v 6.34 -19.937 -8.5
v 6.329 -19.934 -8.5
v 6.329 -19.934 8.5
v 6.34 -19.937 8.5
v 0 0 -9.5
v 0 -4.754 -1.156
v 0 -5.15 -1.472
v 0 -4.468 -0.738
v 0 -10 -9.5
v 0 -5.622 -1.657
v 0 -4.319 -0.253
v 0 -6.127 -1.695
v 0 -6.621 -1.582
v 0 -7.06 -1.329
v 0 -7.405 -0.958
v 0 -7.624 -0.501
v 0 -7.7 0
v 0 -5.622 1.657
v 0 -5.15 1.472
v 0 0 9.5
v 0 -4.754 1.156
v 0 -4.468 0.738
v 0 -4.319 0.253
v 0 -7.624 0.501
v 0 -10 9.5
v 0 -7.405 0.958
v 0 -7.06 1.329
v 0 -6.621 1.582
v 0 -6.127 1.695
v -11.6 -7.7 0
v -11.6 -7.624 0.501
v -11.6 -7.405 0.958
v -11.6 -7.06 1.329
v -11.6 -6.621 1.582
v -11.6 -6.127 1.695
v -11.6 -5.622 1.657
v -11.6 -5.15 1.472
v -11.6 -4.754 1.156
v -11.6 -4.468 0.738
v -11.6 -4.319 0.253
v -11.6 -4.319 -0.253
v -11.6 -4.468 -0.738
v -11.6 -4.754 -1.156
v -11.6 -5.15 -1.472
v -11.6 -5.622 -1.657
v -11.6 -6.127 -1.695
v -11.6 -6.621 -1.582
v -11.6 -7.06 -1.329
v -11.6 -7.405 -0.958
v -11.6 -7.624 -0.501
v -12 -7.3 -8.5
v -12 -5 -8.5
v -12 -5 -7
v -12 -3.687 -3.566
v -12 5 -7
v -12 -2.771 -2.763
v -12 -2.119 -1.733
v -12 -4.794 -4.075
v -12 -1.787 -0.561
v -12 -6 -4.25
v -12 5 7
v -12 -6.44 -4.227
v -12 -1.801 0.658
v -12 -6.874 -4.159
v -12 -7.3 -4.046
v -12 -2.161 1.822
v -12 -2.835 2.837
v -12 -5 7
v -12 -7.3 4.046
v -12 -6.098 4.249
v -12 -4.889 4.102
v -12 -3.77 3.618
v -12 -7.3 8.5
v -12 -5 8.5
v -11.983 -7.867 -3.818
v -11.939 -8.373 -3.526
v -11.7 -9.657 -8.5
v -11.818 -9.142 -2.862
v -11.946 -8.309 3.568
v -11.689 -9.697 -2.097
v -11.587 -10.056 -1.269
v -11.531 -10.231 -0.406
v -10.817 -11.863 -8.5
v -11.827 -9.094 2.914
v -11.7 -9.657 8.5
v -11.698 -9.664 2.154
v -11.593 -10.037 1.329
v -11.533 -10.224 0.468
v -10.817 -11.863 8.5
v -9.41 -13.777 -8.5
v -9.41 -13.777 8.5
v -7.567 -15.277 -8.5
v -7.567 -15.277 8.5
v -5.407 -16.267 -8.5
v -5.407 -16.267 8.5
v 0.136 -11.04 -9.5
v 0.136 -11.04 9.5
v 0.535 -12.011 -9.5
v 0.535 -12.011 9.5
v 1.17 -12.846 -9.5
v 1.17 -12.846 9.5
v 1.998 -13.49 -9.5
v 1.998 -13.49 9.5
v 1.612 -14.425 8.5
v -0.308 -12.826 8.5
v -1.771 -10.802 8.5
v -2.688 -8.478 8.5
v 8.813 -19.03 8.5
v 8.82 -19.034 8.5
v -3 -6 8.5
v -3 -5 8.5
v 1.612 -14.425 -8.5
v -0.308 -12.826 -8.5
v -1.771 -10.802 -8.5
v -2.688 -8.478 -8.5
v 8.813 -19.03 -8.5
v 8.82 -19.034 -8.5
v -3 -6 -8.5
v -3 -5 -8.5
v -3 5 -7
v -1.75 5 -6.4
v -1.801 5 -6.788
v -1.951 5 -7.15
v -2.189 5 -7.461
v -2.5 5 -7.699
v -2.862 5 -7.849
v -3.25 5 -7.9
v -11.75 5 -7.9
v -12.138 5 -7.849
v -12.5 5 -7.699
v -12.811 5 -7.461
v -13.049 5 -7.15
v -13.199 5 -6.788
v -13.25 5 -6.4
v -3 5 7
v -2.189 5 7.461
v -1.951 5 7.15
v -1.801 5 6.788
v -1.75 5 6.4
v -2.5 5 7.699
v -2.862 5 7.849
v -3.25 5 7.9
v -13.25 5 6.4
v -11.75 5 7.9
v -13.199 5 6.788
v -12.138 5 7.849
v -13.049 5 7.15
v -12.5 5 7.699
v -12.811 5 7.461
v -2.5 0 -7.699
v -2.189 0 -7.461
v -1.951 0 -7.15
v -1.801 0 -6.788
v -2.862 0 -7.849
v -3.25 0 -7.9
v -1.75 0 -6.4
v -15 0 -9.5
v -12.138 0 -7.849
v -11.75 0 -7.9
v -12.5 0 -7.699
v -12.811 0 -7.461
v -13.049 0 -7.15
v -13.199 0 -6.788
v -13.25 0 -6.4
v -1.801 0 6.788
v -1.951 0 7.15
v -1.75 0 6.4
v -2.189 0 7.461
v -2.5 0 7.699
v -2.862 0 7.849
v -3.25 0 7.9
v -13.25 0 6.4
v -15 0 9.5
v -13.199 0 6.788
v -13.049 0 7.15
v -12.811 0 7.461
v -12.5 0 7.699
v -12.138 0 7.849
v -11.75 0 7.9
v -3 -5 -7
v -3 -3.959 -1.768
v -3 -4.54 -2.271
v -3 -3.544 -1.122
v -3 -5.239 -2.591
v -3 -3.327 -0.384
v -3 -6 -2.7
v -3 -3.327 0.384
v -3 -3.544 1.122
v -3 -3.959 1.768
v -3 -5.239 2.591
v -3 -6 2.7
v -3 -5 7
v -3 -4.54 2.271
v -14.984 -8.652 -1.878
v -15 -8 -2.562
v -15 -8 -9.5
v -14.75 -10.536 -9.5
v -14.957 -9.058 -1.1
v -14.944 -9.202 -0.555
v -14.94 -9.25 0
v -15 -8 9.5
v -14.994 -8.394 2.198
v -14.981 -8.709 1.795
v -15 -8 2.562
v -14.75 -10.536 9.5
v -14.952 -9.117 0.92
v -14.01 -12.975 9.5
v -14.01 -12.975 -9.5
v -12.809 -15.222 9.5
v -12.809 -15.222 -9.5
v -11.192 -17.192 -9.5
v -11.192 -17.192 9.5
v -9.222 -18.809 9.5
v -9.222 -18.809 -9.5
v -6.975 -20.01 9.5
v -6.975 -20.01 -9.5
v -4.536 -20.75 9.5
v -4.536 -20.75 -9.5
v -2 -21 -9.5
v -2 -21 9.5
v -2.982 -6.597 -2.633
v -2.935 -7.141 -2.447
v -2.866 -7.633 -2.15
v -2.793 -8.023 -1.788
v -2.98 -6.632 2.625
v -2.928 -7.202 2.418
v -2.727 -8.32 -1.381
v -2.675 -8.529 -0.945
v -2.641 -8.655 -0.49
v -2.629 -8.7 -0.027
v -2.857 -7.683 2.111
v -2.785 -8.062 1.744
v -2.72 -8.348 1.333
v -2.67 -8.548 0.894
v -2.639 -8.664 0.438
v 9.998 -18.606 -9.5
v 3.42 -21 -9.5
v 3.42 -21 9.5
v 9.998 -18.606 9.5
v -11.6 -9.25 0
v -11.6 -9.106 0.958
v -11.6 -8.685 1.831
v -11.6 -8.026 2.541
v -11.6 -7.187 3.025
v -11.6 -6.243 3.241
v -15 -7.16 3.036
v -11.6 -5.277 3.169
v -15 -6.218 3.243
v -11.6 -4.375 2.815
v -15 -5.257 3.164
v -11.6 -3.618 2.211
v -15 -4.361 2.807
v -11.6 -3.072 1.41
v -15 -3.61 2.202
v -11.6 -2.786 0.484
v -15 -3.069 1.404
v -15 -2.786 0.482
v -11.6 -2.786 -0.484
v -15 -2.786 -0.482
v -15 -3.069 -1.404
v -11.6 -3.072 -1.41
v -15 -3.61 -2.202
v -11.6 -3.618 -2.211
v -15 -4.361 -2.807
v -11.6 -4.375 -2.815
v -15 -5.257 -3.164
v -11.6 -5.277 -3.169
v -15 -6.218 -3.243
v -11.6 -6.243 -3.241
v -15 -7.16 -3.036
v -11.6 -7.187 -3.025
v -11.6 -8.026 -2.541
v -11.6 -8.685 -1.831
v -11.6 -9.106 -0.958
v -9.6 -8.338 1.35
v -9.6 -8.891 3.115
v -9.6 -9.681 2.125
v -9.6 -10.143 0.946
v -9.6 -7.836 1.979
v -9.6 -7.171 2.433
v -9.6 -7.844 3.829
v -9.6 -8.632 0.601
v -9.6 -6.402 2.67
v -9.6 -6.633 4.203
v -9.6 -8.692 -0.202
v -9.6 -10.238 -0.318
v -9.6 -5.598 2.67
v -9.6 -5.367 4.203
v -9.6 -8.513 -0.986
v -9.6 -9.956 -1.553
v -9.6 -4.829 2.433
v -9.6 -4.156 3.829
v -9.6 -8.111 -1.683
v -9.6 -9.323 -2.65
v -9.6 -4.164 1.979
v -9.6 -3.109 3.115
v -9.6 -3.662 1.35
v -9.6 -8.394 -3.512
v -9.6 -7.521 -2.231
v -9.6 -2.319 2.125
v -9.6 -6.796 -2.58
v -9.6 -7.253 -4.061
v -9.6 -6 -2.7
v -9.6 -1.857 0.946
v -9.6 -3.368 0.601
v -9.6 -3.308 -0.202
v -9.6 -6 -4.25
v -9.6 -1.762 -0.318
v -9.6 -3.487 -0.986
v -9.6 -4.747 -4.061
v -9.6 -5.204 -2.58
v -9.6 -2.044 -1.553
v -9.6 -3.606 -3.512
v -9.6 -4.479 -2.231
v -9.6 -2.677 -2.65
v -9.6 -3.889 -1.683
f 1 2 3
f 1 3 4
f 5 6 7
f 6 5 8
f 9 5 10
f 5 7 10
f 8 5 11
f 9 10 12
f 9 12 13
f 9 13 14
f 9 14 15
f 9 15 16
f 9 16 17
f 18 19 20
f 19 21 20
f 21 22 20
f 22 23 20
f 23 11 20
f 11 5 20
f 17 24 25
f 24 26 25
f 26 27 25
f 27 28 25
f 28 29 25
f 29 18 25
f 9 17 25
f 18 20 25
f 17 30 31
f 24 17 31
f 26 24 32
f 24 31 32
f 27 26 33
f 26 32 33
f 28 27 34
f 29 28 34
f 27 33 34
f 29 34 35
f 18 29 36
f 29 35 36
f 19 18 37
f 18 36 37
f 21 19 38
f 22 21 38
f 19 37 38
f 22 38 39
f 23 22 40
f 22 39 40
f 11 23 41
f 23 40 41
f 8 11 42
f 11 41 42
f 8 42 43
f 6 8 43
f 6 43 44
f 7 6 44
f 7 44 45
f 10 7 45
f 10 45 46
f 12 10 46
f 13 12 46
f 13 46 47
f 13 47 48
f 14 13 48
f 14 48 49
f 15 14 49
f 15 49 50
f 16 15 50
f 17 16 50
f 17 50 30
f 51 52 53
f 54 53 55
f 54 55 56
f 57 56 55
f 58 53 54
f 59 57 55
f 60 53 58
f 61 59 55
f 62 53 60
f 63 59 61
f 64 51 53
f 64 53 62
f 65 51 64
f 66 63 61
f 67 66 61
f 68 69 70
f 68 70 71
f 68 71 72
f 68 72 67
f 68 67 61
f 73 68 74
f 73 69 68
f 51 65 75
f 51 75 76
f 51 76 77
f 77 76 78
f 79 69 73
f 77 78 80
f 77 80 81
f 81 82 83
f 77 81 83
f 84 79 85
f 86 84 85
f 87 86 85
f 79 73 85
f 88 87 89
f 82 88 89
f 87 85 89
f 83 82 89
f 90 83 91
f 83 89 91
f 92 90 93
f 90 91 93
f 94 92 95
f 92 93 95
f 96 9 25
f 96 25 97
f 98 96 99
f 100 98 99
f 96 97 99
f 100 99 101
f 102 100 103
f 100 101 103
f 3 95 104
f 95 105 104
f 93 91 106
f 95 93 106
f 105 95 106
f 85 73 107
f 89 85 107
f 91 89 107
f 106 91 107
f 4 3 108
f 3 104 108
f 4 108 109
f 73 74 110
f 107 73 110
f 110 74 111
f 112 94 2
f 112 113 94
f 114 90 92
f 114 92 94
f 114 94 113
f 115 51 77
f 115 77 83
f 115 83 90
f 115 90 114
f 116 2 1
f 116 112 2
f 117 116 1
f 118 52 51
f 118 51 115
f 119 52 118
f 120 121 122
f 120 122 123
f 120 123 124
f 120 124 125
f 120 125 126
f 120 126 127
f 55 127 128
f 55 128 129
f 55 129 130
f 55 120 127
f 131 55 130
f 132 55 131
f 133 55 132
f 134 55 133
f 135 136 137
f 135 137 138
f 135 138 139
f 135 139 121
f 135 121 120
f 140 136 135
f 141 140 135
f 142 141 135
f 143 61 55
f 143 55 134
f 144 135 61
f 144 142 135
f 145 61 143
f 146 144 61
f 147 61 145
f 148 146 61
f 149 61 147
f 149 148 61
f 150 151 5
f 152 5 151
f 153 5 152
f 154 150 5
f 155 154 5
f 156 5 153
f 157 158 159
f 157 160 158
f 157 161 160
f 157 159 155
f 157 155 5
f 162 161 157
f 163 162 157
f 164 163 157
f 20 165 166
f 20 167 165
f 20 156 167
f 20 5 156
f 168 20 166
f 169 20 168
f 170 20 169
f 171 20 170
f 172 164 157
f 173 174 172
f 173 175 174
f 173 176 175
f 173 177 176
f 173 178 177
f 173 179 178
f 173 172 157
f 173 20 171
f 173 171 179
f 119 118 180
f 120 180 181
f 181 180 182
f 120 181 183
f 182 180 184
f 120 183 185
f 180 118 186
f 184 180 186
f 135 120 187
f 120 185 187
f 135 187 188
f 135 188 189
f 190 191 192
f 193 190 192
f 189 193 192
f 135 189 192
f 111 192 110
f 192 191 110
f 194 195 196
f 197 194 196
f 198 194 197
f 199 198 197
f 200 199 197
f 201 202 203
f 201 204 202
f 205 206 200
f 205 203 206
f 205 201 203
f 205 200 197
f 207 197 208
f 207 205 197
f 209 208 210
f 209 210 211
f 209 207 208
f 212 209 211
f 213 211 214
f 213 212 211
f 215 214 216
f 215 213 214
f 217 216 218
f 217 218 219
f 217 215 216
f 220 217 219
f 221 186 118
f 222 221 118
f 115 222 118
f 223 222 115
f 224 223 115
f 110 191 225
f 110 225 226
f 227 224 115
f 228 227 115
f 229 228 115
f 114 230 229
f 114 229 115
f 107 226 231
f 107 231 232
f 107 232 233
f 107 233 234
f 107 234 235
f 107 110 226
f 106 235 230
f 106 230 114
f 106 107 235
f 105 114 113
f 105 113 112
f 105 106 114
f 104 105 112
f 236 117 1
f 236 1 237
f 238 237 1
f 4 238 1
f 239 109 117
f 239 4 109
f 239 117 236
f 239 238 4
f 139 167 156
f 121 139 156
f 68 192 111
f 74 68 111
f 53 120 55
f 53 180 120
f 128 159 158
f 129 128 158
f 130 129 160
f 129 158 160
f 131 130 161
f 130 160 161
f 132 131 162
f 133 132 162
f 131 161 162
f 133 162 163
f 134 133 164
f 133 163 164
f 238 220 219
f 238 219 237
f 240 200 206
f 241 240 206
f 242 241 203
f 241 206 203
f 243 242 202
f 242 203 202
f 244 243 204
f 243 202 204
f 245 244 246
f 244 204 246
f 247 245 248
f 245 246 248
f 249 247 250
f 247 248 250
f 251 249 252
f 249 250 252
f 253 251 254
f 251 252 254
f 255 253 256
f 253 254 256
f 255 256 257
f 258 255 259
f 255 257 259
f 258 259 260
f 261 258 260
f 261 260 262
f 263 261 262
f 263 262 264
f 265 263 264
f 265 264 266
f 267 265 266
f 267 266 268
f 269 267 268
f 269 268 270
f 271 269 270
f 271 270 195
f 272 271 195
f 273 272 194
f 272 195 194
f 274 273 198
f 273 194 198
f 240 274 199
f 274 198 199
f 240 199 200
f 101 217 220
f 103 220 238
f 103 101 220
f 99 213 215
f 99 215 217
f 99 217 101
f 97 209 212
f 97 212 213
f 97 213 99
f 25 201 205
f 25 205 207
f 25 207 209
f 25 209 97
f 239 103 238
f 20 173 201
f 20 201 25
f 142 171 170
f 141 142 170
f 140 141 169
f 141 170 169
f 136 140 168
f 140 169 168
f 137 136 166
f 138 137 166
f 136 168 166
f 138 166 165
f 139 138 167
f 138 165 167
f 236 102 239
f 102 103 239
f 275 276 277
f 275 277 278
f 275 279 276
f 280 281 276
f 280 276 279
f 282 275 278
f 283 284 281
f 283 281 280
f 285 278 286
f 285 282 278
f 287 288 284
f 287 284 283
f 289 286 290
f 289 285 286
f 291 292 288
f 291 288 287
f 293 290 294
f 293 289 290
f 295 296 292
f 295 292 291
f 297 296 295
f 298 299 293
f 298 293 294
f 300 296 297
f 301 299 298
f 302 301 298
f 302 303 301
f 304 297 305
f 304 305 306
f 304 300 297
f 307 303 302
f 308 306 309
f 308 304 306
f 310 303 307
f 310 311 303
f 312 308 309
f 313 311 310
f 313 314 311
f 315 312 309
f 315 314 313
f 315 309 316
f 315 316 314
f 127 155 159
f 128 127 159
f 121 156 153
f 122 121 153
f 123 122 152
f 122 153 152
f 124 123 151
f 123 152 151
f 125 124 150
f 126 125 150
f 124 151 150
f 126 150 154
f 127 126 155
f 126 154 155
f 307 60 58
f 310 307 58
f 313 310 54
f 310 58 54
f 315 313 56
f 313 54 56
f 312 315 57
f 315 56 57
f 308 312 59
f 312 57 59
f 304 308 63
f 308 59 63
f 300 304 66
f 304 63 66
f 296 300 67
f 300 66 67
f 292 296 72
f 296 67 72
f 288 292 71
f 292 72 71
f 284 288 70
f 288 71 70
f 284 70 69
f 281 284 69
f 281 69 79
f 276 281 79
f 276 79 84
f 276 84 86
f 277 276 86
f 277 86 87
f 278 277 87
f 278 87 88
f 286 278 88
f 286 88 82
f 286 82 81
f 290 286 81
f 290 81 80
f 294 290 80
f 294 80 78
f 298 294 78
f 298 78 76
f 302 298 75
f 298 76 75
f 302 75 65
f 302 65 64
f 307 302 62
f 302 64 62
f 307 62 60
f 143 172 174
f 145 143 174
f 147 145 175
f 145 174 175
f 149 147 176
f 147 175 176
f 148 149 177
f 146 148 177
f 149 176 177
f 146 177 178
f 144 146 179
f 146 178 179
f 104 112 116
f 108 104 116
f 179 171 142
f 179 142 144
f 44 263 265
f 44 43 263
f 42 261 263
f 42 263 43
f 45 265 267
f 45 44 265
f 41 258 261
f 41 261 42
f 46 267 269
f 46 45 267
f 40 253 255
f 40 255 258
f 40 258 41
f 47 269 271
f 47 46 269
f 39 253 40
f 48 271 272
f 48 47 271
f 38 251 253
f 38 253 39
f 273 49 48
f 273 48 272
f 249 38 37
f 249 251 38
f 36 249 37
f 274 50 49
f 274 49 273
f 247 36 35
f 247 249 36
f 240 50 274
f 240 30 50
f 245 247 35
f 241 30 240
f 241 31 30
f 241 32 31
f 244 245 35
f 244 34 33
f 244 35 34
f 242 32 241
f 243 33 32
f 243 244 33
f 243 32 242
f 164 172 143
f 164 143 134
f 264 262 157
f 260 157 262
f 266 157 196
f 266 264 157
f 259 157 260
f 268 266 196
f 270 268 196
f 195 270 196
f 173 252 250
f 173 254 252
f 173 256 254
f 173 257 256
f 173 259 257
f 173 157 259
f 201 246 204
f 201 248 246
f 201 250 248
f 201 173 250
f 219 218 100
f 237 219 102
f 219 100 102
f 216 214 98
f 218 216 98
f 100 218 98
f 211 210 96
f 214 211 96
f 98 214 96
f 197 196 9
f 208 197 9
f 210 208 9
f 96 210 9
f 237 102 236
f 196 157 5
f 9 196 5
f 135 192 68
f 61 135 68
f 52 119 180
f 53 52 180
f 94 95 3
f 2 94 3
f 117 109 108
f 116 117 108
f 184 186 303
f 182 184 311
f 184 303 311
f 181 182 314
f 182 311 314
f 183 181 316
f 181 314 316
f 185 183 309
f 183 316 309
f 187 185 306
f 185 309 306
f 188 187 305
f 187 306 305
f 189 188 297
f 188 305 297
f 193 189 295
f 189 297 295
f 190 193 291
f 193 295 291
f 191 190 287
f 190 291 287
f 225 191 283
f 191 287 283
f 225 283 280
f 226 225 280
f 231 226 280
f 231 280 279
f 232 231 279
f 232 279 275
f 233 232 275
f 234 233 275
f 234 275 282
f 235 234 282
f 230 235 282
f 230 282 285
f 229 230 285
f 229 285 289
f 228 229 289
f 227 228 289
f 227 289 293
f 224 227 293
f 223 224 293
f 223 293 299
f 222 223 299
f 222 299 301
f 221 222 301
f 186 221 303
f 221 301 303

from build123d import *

# Parameters (mm, degrees)
CYLINDER001_R           = 4.25
CYLINDER001_DEPTH       = 3.4
CYLINDER001_PITCH_ANGLE = 90
CYLINDER_R              = 2.7
CYLINDER_DEPTH          = 11
CYLINDER_PITCH_ANGLE    = 90
PAD001_DEPTH            = 8.5
SKETCH002_W             = 6
SKETCH002_H             = 1.5
POCKET_DEPTH            = 9.001
PAD_DEPTH               = 9.5
SKETCH003_R             = 3.25
POCKET001_DEPTH         = 3.4
SKETCH004_R             = 1.7
POCKET002_DEPTH         = 24.998848
SKETCH005_W             = 9
SKETCH005_H             = 14
PAD002_DEPTH            = 5


with BuildPart() as cylinder001:
    # Cylinder001 → Cylinder001 (new body)
    with BuildSketch(Plane.XY):
        Circle(CYLINDER001_R)
    extrude(amount=CYLINDER001_DEPTH)


with BuildPart() as cylinder001_1:
    # Cylinder001 pitch: moved
    add(cylinder001.part.rotate(Axis((0, 0, 0), (0, 1, 0)), CYLINDER001_PITCH_ANGLE))


with BuildPart() as cylinder001_2:
    # Cylinder001 placement: moved
    add(cylinder001_1.part.moved(Location((-13, -6, 0))))


with BuildPart() as screw_tube:
    # Cylinder → Cylinder (new body)
    with BuildSketch(Plane.XY):
        Circle(CYLINDER_R)
    extrude(amount=CYLINDER_DEPTH)


with BuildPart() as screw_tube_1:
    # Cylinder pitch: moved
    add(screw_tube.part.rotate(Axis((0, 0, 0), (0, 1, 0)), CYLINDER_PITCH_ANGLE))


with BuildPart() as screw_tube_2:
    # Cylinder placement: moved
    add(screw_tube_1.part.moved(Location((-12.6, -6, 0))))

    # Fusion: union Cylinder001
    add(cylinder001_2.part)


with BuildPart() as pocket:
    # Sketch001 → Pad001 (new body, symmetric)
    with BuildSketch(Plane.XY):
        with BuildLine():
            Line((-12, 0), (-12, -7.3))
            ThreePointArc((-12, -7.3), (-10.174376, -12.864965), (-5.407034, -16.267051))
            Line((-5.407034, -16.267051), (6.329406, -19.933783))
            Line((6.329406, -19.933783), (7.579268, -20.324269))
            Line((7.579268, -20.324269), (9.655694, -19.568512))
            Line((9.655694, -19.568512), (8.813242, -19.029741))
            Line((1.612292, -14.424542), (8.813242, -19.029741))
            ThreePointArc((-3, -6), (-1.771466, -10.802245), (1.612292, -14.424542))
            Line((-3, 0), (-3, -6))
            Line((-3, 1), (-3, 0))
            Line((-12, 1), (-3, 1))
            Line((-12, 0), (-12, 1))
        make_face()
    extrude(amount=PAD001_DEPTH, both=True)

    # Sketch002 → Pocket (cut, through all)
    with BuildSketch(Plane.YZ.offset(-3)):
        with Locations((-2, 7.75)):
            Rectangle(SKETCH002_W, SKETCH002_H)
        with Locations((-2, -7.75)):
            Rectangle(SKETCH002_W, SKETCH002_H)
    extrude(amount=-POCKET_DEPTH, mode=Mode.SUBTRACT)


with BuildPart() as top:
    # Sketch → Pad (new body, symmetric)
    with BuildSketch(Plane.XY):
        with BuildLine():
            Line((0, 0), (-15, 0))
            Line((-15, 0), (-15, -8))
            ThreePointArc((-15, -8), (-11.192388, -17.192388), (-2, -21))
            Line((-2, -21), (3.42, -21))
            Line((3.42, -21), (9.997848, -18.605859))
            Line((1.997848, -13.489646), (9.997848, -18.605859))
            ThreePointArc((0, -10), (0.5348, -12.010537), (1.997848, -13.489646))
            Line((0, 0), (0, -10))
        make_face()
    extrude(amount=PAD_DEPTH, both=True)

    # Cut: cut Pocket
    add(pocket.part, mode=Mode.SUBTRACT)

    # Fusion001: union screw-tube
    add(screw_tube_2.part)

    # Sketch003 → Pocket001 (cut)
    with BuildSketch(Plane(origin=(-15, 0, 0), x_dir=(0, -1, 0), z_dir=(-1, 0, 0))):
        with Locations((6, 0)):
            Circle(SKETCH003_R)
    extrude(amount=-POCKET001_DEPTH, mode=Mode.SUBTRACT)

    # Sketch004 → Pocket002 (cut, through all)
    with BuildSketch(Plane(origin=(-15, 0, 0), x_dir=(0, -1, 0), z_dir=(-1, 0, 0))):
        with Locations((6, 0)):
            Circle(SKETCH004_R)
    extrude(amount=-POCKET002_DEPTH, mode=Mode.SUBTRACT)

    # Sketch005 → Pad002 (new body)
    with BuildSketch(Plane(origin=(0, 0, 0), x_dir=(-1, 0, 0), z_dir=(0, 1, 0))):
        with BuildLine():
            ThreePointArc((3.25, 7.9), (2.18934, 7.46066), (1.75, 6.4))
            Line((1.75, 6.4), (1.75, -6.4))
            ThreePointArc((1.75, -6.4), (2.18934, -7.46066), (3.25, -7.9))
            Line((3.25, -7.9), (11.75, -7.9))
            ThreePointArc((11.75, -7.9), (12.81066, -7.46066), (13.25, -6.4))
            Line((13.25, 6.4), (13.25, -6.4))
            ThreePointArc((13.25, 6.4), (12.81066, 7.46066), (11.75, 7.9))
            Line((3.25, 7.9), (11.75, 7.9))
        make_face()
        with Locations((7.5, 0)):
            Rectangle(SKETCH005_W, SKETCH005_H, mode=Mode.SUBTRACT)
    extrude(amount=PAD002_DEPTH)


solid = top.part
